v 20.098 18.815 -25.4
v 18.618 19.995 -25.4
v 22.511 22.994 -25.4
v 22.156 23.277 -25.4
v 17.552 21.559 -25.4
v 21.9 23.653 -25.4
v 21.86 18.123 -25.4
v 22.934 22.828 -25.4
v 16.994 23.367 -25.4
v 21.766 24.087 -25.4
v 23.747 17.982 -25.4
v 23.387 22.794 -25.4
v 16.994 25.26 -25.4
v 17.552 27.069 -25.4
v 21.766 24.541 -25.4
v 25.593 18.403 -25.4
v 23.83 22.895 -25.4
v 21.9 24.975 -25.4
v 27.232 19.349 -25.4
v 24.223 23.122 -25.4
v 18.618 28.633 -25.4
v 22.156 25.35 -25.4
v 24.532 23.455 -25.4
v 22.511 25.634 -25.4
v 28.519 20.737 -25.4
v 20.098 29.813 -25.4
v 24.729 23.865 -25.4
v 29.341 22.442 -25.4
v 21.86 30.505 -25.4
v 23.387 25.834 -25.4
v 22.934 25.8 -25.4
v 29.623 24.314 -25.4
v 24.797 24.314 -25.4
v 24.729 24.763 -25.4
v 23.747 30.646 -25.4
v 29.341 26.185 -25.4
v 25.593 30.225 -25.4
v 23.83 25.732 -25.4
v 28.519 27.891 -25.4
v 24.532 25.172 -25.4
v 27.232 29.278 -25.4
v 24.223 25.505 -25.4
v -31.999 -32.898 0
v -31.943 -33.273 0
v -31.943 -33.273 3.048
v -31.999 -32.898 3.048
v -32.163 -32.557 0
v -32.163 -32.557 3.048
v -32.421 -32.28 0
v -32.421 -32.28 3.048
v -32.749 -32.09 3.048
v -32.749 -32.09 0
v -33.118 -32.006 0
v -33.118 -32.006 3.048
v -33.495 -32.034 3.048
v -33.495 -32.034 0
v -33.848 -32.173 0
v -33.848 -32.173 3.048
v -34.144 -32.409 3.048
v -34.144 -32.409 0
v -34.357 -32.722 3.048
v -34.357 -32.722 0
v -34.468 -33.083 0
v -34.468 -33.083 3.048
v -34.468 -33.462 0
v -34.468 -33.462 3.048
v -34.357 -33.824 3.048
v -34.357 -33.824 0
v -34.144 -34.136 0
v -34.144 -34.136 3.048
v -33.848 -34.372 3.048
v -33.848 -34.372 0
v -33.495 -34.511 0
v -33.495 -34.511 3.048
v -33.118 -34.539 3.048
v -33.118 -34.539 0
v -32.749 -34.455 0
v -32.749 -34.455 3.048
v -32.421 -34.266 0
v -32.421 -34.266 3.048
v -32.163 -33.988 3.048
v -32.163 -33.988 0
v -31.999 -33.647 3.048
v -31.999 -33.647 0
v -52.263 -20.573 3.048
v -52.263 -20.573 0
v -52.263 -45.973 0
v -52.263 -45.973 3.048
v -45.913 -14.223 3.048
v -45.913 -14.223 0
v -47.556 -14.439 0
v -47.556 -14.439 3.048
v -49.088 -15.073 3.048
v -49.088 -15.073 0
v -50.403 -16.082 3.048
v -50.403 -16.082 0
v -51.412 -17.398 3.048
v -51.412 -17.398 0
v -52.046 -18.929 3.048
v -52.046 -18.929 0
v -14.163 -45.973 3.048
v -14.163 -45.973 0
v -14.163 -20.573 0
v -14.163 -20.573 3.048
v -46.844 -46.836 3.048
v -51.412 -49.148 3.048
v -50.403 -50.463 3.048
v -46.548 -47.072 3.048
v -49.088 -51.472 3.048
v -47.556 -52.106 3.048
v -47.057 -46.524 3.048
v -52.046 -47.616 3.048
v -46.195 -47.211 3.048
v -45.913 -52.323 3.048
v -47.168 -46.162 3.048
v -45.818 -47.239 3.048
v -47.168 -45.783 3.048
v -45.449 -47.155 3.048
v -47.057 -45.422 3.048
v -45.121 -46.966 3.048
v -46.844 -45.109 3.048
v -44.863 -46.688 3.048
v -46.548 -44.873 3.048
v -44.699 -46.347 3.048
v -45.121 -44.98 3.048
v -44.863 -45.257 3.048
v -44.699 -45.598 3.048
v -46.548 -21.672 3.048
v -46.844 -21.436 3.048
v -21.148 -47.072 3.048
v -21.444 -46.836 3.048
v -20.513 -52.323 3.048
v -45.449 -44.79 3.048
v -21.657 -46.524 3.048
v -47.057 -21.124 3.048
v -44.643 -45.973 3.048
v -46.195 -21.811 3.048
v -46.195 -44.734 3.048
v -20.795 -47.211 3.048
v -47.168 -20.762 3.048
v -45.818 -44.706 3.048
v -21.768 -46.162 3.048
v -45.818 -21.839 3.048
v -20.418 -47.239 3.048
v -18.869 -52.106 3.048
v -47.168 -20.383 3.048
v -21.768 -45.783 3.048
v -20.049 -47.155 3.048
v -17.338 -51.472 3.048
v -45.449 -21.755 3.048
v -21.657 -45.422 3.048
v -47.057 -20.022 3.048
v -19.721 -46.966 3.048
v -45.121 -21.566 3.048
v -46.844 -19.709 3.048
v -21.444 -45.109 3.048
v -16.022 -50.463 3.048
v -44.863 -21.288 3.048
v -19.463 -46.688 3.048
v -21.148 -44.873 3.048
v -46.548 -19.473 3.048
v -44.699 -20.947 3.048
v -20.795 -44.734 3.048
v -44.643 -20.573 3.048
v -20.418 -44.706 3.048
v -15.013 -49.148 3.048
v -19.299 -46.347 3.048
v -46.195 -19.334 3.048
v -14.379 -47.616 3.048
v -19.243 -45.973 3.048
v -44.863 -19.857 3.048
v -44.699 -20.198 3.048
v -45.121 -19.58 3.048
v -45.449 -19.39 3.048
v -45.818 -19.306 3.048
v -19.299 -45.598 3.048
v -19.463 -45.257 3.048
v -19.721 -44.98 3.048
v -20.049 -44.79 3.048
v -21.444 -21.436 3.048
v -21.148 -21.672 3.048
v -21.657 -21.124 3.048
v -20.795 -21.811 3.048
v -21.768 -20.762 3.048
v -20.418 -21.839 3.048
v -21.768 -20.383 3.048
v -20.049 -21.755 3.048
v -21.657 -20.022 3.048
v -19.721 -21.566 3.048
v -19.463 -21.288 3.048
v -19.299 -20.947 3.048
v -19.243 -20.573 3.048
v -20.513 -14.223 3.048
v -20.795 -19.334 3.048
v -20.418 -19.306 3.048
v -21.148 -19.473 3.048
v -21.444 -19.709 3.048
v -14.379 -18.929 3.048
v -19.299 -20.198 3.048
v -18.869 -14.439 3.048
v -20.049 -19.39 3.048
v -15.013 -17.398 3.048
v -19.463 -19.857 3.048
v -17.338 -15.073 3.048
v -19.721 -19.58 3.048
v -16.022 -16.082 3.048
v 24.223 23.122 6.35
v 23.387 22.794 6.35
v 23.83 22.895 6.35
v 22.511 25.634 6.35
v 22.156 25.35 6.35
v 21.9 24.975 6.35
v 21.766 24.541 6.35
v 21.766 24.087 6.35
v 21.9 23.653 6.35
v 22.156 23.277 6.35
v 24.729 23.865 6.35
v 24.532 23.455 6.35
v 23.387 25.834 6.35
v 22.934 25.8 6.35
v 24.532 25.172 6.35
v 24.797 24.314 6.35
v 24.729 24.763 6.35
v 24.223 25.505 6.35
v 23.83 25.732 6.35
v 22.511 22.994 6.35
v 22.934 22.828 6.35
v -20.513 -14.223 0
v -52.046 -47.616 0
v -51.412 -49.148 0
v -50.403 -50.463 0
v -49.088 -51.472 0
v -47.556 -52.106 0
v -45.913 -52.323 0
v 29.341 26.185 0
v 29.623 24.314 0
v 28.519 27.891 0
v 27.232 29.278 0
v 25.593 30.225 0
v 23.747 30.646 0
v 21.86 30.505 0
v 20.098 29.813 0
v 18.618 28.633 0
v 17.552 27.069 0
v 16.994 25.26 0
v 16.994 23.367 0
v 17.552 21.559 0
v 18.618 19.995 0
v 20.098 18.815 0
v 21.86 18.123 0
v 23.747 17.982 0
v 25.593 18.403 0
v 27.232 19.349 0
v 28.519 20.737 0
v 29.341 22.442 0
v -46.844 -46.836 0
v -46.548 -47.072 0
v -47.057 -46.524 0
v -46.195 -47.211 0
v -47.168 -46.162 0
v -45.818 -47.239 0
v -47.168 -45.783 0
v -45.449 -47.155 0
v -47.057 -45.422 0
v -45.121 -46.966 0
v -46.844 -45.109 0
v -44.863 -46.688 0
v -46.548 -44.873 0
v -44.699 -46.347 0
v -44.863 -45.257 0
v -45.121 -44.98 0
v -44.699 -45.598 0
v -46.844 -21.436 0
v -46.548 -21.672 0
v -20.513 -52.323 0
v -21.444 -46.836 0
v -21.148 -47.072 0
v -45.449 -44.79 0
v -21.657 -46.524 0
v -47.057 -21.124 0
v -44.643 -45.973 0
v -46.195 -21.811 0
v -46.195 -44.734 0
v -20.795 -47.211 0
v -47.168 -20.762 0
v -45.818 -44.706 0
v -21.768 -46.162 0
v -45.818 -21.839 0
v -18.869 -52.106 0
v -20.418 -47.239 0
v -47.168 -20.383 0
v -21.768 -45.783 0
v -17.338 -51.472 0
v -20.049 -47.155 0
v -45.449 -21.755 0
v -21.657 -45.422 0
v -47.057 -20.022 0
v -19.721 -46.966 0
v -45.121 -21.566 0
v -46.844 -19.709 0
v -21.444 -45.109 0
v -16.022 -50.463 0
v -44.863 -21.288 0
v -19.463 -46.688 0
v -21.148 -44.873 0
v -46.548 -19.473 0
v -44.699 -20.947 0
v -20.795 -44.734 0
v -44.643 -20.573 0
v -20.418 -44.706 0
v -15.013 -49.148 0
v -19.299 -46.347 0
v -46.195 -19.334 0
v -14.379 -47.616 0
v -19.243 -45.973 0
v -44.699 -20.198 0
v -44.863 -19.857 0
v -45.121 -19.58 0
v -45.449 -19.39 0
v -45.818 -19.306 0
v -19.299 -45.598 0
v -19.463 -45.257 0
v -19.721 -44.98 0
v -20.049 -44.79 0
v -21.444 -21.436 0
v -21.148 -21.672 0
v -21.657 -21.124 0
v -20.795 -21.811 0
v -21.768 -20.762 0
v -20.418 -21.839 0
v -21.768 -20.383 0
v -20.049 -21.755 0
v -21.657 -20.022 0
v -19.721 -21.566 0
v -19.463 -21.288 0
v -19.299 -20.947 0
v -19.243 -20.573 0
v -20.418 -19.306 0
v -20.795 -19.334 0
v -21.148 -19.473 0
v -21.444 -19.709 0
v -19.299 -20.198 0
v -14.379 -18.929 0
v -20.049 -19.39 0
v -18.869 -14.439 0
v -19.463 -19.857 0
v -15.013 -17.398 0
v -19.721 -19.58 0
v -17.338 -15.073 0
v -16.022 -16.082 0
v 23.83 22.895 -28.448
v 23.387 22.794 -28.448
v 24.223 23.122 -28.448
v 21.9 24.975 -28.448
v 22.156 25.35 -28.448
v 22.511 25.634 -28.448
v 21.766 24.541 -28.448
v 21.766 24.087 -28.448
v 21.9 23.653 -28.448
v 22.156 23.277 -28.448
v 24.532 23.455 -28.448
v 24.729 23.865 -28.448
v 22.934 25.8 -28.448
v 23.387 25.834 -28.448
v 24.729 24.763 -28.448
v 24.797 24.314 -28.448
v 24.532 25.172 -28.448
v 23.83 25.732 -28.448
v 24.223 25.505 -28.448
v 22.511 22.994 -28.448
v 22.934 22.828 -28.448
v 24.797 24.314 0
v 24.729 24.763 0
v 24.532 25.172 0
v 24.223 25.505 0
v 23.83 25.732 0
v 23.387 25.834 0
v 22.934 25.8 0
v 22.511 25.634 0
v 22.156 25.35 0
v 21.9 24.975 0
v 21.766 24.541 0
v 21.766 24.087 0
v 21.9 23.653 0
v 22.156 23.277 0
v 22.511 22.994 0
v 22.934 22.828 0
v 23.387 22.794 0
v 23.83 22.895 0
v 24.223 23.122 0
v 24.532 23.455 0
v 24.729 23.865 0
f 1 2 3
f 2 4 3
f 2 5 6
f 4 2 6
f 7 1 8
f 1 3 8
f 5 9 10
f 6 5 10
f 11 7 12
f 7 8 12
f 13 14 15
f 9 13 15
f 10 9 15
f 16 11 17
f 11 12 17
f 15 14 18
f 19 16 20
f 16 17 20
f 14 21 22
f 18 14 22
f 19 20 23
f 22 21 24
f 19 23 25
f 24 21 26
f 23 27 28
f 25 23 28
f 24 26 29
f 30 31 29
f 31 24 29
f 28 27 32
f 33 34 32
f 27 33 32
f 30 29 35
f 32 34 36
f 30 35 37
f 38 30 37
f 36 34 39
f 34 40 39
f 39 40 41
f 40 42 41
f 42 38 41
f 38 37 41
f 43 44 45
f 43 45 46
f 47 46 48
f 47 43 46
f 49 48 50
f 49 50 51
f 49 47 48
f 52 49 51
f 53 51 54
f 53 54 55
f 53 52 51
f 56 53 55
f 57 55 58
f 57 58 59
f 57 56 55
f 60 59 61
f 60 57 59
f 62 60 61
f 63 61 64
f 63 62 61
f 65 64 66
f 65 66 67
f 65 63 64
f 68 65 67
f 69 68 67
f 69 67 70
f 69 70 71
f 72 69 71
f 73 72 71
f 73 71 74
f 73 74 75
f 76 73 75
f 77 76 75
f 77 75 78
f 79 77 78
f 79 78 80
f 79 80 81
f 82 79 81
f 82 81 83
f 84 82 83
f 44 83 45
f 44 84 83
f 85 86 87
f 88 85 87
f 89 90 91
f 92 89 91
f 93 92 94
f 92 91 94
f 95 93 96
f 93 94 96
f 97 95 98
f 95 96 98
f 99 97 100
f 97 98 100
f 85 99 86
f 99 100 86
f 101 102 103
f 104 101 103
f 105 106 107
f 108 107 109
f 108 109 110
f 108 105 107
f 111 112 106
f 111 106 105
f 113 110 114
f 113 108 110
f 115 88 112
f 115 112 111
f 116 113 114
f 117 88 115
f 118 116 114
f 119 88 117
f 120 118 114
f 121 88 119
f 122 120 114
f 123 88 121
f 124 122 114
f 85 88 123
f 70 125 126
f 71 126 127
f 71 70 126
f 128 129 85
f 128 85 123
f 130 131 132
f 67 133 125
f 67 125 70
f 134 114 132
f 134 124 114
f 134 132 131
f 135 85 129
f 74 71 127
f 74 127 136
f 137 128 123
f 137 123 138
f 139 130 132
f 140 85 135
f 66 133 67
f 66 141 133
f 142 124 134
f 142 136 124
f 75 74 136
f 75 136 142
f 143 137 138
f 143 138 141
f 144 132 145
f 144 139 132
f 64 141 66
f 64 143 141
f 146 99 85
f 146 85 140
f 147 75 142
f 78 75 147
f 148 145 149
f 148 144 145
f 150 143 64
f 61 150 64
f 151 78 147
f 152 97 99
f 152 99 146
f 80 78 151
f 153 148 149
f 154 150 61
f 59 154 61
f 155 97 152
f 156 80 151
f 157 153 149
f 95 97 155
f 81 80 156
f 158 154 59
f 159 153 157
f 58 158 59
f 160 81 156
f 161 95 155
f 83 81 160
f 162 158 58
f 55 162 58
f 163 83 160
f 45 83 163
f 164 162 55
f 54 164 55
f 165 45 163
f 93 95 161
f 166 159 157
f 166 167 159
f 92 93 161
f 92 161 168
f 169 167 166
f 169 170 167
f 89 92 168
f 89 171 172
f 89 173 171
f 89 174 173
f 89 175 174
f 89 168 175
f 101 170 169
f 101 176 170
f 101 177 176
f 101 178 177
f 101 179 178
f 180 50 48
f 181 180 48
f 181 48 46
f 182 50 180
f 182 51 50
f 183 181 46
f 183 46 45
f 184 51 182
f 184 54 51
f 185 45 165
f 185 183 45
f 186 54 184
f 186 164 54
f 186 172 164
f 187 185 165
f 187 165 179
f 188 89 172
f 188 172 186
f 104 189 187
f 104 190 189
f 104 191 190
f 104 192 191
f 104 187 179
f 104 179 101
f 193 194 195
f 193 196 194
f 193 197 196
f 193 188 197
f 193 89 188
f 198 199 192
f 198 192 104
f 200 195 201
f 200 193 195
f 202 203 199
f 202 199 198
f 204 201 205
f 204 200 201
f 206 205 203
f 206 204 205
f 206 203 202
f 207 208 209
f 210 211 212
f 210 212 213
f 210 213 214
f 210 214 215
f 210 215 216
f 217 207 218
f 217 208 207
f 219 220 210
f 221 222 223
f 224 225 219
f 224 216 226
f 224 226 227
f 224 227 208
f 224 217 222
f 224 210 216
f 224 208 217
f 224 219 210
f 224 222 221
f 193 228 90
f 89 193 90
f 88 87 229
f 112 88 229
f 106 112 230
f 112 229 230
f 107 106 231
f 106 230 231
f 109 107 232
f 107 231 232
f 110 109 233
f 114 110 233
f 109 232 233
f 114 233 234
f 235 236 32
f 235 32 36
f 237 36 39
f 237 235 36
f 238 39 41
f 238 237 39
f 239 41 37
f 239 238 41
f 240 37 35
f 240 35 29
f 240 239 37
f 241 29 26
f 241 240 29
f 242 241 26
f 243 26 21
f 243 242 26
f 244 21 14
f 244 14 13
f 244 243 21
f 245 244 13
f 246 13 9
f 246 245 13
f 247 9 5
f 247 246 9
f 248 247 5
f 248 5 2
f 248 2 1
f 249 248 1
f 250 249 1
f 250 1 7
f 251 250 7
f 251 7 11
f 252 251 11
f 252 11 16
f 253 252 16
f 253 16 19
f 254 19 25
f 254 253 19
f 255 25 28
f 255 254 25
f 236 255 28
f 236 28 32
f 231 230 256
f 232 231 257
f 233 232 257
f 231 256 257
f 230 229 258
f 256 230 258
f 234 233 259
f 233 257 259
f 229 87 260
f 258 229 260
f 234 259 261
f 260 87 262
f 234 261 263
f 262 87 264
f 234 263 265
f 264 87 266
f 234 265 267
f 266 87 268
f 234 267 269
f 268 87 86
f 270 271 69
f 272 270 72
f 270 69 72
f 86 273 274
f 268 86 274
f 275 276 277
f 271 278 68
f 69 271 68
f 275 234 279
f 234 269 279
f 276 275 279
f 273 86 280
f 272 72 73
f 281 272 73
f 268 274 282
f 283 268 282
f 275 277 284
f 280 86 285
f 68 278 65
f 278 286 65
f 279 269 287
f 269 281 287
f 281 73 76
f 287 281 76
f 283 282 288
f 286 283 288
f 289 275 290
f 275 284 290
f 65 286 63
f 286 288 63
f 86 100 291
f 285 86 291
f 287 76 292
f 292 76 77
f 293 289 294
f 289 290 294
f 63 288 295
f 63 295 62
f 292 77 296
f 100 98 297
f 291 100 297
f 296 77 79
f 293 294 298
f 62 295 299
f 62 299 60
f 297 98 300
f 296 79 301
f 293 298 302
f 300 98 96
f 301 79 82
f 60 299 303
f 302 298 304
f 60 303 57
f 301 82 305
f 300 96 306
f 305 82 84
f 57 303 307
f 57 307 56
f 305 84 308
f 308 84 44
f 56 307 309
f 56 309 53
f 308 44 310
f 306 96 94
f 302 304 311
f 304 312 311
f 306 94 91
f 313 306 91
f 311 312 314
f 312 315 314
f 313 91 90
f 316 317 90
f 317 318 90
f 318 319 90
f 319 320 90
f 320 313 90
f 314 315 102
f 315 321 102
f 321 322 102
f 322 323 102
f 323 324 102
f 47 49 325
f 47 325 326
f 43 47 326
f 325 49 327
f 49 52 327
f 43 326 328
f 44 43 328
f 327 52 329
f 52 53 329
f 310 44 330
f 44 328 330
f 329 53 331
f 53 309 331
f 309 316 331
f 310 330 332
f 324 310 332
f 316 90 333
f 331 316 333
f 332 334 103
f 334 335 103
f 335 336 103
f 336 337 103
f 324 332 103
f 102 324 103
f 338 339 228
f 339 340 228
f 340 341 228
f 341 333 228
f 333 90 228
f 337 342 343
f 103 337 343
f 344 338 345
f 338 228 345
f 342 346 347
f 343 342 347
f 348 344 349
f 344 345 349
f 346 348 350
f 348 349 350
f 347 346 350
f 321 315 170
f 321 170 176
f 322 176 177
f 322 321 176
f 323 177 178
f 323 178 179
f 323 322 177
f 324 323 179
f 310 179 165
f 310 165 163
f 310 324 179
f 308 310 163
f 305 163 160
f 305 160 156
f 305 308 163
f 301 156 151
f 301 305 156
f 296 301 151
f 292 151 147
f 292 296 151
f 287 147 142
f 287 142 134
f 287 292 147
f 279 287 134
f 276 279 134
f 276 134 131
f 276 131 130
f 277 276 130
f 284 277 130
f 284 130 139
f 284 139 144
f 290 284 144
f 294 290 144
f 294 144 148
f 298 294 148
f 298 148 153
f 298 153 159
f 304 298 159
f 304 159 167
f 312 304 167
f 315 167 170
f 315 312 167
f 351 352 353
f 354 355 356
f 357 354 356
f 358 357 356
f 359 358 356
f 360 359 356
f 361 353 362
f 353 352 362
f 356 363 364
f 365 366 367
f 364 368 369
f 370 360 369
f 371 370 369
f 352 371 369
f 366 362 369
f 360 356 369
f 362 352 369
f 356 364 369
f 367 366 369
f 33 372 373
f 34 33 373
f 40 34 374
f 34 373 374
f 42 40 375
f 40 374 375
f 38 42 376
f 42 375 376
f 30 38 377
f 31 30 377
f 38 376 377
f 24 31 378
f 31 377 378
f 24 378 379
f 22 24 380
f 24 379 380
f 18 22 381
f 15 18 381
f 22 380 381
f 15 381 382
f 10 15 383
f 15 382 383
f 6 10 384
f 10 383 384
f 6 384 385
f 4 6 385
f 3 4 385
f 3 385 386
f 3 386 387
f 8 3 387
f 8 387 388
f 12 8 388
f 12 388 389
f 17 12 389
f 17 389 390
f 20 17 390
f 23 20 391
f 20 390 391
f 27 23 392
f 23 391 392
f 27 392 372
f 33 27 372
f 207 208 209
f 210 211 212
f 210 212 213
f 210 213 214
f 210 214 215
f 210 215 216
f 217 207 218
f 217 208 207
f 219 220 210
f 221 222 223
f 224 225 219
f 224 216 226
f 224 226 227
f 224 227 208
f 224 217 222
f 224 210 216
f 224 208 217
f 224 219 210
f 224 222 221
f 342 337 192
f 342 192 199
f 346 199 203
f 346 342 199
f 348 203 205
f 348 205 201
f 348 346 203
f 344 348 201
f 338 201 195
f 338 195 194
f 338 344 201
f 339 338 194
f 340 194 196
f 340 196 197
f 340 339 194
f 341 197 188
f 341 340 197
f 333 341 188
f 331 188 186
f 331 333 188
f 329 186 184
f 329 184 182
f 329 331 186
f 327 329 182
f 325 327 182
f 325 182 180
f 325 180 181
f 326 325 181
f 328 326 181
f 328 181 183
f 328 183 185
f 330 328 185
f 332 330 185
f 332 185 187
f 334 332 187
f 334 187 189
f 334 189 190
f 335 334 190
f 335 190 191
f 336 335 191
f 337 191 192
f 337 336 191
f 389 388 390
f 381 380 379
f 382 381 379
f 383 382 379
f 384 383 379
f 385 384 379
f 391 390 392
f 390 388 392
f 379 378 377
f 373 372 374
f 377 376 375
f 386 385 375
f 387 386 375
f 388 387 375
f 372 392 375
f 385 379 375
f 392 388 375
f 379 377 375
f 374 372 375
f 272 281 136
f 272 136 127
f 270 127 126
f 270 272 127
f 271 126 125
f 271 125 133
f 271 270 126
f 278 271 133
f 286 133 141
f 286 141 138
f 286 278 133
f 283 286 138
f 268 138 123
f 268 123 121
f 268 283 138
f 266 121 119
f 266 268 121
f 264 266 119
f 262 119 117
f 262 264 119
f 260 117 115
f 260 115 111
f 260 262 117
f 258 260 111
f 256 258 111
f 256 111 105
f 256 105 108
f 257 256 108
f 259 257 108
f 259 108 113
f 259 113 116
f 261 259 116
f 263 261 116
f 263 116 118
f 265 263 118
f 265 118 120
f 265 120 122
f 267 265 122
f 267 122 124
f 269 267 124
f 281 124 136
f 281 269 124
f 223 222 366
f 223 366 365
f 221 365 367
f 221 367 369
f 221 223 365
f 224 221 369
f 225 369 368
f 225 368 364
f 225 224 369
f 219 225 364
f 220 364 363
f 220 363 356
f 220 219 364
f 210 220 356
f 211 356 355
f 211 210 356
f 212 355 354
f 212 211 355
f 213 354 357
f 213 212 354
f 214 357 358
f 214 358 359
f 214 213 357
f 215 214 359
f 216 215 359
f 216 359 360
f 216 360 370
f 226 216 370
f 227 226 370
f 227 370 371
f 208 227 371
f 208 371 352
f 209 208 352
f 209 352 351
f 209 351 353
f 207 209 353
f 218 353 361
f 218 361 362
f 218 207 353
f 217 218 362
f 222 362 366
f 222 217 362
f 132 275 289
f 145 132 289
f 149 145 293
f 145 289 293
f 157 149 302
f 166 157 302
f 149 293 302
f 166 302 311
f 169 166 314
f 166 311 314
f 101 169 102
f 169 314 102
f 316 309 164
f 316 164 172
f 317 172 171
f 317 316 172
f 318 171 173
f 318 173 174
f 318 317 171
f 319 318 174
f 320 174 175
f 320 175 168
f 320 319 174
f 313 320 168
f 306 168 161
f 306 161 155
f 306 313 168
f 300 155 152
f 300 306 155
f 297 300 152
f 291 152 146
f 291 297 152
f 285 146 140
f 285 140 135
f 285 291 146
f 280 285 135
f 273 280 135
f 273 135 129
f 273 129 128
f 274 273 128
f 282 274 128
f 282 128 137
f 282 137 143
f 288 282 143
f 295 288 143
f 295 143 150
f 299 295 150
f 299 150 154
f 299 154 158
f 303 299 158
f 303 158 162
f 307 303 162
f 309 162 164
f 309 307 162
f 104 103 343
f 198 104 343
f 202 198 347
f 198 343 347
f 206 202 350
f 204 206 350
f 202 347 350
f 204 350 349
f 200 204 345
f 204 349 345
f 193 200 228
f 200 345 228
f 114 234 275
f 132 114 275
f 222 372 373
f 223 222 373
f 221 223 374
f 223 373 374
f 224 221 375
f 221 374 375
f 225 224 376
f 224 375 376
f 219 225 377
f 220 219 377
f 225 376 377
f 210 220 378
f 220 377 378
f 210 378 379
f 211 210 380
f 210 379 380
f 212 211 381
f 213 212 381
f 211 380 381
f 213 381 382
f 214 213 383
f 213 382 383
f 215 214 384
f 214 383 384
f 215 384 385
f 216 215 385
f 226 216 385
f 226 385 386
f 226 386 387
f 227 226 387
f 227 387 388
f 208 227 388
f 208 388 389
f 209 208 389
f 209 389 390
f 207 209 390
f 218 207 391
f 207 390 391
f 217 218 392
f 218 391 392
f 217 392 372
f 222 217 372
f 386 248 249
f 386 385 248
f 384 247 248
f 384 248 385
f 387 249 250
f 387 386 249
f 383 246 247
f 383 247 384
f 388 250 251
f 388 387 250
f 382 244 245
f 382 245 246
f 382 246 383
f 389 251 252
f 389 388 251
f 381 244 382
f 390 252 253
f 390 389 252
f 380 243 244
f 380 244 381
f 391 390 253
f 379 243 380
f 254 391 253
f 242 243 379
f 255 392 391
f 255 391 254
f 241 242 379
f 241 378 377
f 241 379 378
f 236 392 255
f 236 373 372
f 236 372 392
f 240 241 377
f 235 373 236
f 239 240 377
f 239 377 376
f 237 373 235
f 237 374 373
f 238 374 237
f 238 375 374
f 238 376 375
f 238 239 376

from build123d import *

# Parameters (mm, degrees)
F0_R     = 1.27
F1_DEPTH = 3.048
F2_R     = 1.524
F3_DEPTH = 6.35
F2_R_2   = 6.35
F4_DEPTH = 25.4
F5_DEPTH = 34.798


with BuildPart() as f1:
    # F0 (on Top) → F1 (new body)
    with BuildSketch(Plane.XY):
        with BuildLine():
            Line((-20.5126005113, -14.2226074874), (-45.9126005113, -14.2226074874))
            ThreePointArc((-45.9126005113, -14.2226074874), (-50.4027285718, -16.0824794269), (-52.2626005113, -20.5726074874))
            Line((-52.2626005113, -20.5726074874), (-52.2626005113, -45.9726074874))
            ThreePointArc((-52.2626005113, -45.9726074874), (-50.4027285718, -50.462735548), (-45.9126005113, -52.3226074874))
            Line((-45.9126005113, -52.3226074874), (-20.5126005113, -52.3226074874))
            ThreePointArc((-20.5126005113, -52.3226074874), (-16.0224724508, -50.462735548), (-14.1626005113, -45.9726074874))
            Line((-14.1626005113, -45.9726074874), (-14.1626005113, -20.5726074874))
            ThreePointArc((-14.1626005113, -20.5726074874), (-16.0224724508, -16.0824794269), (-20.5126005113, -14.2226074874))
        make_face()
        with Locations((-45.9126005113, -45.9726074874)):
            Circle(F0_R, mode=Mode.SUBTRACT)
        with Locations((-33.2126005113, -33.2726074874)):
            Circle(F0_R, mode=Mode.SUBTRACT)
        with Locations((-20.5126005113, -45.9726074874)):
            Circle(F0_R, mode=Mode.SUBTRACT)
        with Locations((-45.9126005113, -20.5726074874)):
            Circle(F0_R, mode=Mode.SUBTRACT)
        with Locations((-20.5126005113, -20.5726074874)):
            Circle(F0_R, mode=Mode.SUBTRACT)
    extrude(amount=F1_DEPTH)


with BuildPart() as f3:
    # F2 (on Top) → F3 (new body)
    with BuildSketch(Plane.XY):
        with Locations((23.2728645205, 24.313762784)):
            Circle(F2_R)
    extrude(amount=F3_DEPTH)

    # F2 (on Top) → F4 (join)
    with BuildSketch(Plane.XY):
        with Locations((23.2728645205, 24.313762784)):
            Circle(F2_R_2)
        with Locations((23.2728645205, 24.313762784)):
            Circle(F2_R, mode=Mode.SUBTRACT)
    extrude(amount=-F4_DEPTH)


with BuildPart() as f5:
    # F5 (new): a face of the model
    f5_faces = [f3.part.faces().sort_by_distance(p)[0] for p in [
        (23.2728645205, 24.313762784, 6.35),
    ]]
    extrude(f5_faces, amount=-F5_DEPTH)


solid = Compound([f1.part, f3.part, f5.part])
